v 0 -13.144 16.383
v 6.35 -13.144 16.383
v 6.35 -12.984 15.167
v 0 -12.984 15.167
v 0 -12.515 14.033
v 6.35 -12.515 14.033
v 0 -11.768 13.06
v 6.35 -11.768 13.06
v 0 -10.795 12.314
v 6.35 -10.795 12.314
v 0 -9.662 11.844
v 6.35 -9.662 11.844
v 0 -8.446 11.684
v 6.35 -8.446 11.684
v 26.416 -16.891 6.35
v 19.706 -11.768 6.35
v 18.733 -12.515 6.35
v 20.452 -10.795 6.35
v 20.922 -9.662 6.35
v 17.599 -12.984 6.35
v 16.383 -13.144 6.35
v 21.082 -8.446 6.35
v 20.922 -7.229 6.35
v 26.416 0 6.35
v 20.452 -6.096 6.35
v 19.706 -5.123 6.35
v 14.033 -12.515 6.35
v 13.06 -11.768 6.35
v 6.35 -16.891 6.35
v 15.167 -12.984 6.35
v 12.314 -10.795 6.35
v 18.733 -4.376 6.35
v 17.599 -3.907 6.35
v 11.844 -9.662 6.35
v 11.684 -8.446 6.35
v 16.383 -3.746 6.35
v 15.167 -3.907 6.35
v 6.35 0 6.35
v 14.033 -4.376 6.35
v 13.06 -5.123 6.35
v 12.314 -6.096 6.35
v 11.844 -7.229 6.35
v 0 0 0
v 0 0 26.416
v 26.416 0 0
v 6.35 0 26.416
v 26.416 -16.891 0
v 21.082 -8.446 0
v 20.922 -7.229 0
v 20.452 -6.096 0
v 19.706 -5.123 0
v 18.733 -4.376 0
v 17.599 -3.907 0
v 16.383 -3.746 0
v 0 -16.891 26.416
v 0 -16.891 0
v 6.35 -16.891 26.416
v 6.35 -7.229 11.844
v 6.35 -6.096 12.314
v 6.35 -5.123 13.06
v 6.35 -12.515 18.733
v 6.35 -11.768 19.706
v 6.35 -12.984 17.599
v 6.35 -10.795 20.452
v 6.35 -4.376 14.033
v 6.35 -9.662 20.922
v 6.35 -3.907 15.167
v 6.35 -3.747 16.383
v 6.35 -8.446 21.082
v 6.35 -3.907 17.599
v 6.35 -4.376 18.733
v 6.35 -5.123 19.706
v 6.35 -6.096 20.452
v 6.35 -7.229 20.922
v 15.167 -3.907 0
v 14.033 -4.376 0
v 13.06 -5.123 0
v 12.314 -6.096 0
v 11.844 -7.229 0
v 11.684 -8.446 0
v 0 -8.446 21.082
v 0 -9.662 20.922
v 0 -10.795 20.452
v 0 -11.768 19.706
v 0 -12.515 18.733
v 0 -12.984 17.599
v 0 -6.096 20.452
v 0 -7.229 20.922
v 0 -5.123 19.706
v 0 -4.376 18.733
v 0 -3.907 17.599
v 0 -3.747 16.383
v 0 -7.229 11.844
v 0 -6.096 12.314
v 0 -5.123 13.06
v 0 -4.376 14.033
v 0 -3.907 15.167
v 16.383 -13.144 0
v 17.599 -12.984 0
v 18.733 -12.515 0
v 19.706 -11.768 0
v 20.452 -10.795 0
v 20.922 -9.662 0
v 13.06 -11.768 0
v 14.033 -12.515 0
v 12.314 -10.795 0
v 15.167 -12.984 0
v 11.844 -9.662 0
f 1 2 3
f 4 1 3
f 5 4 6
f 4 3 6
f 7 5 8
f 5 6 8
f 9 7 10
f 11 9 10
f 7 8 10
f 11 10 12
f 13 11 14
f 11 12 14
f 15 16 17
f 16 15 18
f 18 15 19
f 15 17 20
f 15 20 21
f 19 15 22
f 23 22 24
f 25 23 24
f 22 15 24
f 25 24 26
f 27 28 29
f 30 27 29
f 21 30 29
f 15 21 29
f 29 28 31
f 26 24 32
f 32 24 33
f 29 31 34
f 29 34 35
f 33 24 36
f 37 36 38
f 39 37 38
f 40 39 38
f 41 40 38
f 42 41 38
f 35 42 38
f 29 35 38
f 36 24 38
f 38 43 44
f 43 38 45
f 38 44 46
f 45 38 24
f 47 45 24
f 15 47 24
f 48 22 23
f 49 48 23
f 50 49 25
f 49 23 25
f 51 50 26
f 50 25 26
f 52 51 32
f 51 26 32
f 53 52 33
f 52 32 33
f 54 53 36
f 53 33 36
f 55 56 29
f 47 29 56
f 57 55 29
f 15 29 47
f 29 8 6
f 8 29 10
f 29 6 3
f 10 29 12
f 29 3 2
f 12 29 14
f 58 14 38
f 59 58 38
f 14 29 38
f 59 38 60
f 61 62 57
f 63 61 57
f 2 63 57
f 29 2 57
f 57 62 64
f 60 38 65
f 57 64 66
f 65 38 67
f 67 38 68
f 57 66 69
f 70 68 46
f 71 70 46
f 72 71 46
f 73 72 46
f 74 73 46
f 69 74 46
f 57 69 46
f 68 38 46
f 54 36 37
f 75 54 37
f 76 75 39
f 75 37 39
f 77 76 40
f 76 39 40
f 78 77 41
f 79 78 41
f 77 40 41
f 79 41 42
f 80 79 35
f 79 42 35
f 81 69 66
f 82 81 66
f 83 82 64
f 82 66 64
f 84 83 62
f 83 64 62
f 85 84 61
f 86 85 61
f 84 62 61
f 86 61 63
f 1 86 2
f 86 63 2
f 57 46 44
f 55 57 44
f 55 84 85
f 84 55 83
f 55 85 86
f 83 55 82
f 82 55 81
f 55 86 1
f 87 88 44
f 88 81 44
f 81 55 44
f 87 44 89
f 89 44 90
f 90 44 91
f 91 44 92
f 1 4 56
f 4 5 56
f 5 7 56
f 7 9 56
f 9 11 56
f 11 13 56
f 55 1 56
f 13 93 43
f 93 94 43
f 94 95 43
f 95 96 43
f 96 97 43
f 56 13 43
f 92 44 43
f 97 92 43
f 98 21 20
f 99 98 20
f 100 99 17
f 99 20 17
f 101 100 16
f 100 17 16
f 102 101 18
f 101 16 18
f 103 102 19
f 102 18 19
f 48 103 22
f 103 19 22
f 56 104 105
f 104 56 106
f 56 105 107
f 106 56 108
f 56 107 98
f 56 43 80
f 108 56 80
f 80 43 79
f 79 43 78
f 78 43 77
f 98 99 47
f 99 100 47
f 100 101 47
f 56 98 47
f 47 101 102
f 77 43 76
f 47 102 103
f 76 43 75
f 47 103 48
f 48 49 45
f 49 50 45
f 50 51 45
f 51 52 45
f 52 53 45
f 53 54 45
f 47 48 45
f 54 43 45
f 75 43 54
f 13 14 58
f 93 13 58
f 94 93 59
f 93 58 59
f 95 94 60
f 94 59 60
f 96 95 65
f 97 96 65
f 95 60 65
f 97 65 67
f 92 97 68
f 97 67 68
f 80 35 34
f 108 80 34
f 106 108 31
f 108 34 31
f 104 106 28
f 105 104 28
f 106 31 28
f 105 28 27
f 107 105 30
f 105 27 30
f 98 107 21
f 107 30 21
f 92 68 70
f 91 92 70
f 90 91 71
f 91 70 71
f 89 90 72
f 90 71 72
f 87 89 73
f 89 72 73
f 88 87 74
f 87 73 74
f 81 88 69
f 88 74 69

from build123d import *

# Parameters (mm, degrees)
F1_DEPTH = 16.891
F3_DEPTH = 6.35
F5_DEPTH = 6.35


with BuildPart() as f1:
    # F0 (on Front) → F1 (new body)
    with BuildSketch(Plane.XZ):
        Polygon((0, 6.35), (0, 0), (6.35, 0), (26.416, 0), (26.416, 6.35), (6.35, 6.35), (6.35, 26.416), (0, 26.416), align=None)
    extrude(amount=F1_DEPTH)

    # F2 (on face) → F3 (cut, through all)
    with BuildSketch(Plane.YZ.offset(6.35)):
        with BuildLine():
            Line((-8.4455, 16.383), (-3.7465, 16.383))
            ThreePointArc((-3.7465, 16.383), (-5.122805, 19.705695), (-8.4455, 21.082))
            Line((-8.4455, 21.082), (-8.4455, 16.383))
        make_face()
        with BuildLine():
            ThreePointArc((-8.4455, 11.684), (-5.122805, 13.060305), (-3.7465, 16.383))
            Line((-3.7465, 16.383), (-8.4455, 16.383))
            Line((-8.4455, 16.383), (-8.4455, 11.684))
        make_face()
        with BuildLine():
            Line((-8.4455, 16.383), (-8.4455, 21.082))
            ThreePointArc((-8.4455, 21.082), (-11.768195, 19.705695), (-13.1445, 16.383))
            Line((-13.1445, 16.383), (-8.4455, 16.383))
        make_face()
        with BuildLine():
            ThreePointArc((-13.1445, 16.383), (-11.768195, 13.060305), (-8.4455, 11.684))
            Line((-8.4455, 11.684), (-8.4455, 16.383))
            Line((-8.4455, 16.383), (-13.1445, 16.383))
        make_face()
    extrude(amount=-F3_DEPTH, mode=Mode.SUBTRACT)

    # F4 (on face) → F5 (cut, through all)
    with BuildSketch(Plane.XY.offset(6.35)):
        with BuildLine():
            Line((16.383, -8.4455), (21.082, -8.4455))
            ThreePointArc((21.082, -8.4455), (19.705695, -5.122805), (16.383, -3.7465))
            Line((16.383, -3.7465), (16.383, -8.4455))
        make_face()
        with BuildLine():
            ThreePointArc((16.383, -13.1445), (19.705695, -11.768195), (21.082, -8.4455))
            Line((21.082, -8.4455), (16.383, -8.4455))
            Line((16.383, -8.4455), (16.383, -13.1445))
        make_face()
        with BuildLine():
            Line((16.383, -8.4455), (16.383, -3.7465))
            ThreePointArc((16.383, -3.7465), (13.060305, -5.122805), (11.684, -8.4455))
            Line((11.684, -8.4455), (16.383, -8.4455))
        make_face()
        with BuildLine():
            ThreePointArc((11.684, -8.4455), (13.060305, -11.768195), (16.383, -13.1445))
            Line((16.383, -13.1445), (16.383, -8.4455))
            Line((16.383, -8.4455), (11.684, -8.4455))
        make_face()
    extrude(amount=-F5_DEPTH, mode=Mode.SUBTRACT)


solid = f1.part
